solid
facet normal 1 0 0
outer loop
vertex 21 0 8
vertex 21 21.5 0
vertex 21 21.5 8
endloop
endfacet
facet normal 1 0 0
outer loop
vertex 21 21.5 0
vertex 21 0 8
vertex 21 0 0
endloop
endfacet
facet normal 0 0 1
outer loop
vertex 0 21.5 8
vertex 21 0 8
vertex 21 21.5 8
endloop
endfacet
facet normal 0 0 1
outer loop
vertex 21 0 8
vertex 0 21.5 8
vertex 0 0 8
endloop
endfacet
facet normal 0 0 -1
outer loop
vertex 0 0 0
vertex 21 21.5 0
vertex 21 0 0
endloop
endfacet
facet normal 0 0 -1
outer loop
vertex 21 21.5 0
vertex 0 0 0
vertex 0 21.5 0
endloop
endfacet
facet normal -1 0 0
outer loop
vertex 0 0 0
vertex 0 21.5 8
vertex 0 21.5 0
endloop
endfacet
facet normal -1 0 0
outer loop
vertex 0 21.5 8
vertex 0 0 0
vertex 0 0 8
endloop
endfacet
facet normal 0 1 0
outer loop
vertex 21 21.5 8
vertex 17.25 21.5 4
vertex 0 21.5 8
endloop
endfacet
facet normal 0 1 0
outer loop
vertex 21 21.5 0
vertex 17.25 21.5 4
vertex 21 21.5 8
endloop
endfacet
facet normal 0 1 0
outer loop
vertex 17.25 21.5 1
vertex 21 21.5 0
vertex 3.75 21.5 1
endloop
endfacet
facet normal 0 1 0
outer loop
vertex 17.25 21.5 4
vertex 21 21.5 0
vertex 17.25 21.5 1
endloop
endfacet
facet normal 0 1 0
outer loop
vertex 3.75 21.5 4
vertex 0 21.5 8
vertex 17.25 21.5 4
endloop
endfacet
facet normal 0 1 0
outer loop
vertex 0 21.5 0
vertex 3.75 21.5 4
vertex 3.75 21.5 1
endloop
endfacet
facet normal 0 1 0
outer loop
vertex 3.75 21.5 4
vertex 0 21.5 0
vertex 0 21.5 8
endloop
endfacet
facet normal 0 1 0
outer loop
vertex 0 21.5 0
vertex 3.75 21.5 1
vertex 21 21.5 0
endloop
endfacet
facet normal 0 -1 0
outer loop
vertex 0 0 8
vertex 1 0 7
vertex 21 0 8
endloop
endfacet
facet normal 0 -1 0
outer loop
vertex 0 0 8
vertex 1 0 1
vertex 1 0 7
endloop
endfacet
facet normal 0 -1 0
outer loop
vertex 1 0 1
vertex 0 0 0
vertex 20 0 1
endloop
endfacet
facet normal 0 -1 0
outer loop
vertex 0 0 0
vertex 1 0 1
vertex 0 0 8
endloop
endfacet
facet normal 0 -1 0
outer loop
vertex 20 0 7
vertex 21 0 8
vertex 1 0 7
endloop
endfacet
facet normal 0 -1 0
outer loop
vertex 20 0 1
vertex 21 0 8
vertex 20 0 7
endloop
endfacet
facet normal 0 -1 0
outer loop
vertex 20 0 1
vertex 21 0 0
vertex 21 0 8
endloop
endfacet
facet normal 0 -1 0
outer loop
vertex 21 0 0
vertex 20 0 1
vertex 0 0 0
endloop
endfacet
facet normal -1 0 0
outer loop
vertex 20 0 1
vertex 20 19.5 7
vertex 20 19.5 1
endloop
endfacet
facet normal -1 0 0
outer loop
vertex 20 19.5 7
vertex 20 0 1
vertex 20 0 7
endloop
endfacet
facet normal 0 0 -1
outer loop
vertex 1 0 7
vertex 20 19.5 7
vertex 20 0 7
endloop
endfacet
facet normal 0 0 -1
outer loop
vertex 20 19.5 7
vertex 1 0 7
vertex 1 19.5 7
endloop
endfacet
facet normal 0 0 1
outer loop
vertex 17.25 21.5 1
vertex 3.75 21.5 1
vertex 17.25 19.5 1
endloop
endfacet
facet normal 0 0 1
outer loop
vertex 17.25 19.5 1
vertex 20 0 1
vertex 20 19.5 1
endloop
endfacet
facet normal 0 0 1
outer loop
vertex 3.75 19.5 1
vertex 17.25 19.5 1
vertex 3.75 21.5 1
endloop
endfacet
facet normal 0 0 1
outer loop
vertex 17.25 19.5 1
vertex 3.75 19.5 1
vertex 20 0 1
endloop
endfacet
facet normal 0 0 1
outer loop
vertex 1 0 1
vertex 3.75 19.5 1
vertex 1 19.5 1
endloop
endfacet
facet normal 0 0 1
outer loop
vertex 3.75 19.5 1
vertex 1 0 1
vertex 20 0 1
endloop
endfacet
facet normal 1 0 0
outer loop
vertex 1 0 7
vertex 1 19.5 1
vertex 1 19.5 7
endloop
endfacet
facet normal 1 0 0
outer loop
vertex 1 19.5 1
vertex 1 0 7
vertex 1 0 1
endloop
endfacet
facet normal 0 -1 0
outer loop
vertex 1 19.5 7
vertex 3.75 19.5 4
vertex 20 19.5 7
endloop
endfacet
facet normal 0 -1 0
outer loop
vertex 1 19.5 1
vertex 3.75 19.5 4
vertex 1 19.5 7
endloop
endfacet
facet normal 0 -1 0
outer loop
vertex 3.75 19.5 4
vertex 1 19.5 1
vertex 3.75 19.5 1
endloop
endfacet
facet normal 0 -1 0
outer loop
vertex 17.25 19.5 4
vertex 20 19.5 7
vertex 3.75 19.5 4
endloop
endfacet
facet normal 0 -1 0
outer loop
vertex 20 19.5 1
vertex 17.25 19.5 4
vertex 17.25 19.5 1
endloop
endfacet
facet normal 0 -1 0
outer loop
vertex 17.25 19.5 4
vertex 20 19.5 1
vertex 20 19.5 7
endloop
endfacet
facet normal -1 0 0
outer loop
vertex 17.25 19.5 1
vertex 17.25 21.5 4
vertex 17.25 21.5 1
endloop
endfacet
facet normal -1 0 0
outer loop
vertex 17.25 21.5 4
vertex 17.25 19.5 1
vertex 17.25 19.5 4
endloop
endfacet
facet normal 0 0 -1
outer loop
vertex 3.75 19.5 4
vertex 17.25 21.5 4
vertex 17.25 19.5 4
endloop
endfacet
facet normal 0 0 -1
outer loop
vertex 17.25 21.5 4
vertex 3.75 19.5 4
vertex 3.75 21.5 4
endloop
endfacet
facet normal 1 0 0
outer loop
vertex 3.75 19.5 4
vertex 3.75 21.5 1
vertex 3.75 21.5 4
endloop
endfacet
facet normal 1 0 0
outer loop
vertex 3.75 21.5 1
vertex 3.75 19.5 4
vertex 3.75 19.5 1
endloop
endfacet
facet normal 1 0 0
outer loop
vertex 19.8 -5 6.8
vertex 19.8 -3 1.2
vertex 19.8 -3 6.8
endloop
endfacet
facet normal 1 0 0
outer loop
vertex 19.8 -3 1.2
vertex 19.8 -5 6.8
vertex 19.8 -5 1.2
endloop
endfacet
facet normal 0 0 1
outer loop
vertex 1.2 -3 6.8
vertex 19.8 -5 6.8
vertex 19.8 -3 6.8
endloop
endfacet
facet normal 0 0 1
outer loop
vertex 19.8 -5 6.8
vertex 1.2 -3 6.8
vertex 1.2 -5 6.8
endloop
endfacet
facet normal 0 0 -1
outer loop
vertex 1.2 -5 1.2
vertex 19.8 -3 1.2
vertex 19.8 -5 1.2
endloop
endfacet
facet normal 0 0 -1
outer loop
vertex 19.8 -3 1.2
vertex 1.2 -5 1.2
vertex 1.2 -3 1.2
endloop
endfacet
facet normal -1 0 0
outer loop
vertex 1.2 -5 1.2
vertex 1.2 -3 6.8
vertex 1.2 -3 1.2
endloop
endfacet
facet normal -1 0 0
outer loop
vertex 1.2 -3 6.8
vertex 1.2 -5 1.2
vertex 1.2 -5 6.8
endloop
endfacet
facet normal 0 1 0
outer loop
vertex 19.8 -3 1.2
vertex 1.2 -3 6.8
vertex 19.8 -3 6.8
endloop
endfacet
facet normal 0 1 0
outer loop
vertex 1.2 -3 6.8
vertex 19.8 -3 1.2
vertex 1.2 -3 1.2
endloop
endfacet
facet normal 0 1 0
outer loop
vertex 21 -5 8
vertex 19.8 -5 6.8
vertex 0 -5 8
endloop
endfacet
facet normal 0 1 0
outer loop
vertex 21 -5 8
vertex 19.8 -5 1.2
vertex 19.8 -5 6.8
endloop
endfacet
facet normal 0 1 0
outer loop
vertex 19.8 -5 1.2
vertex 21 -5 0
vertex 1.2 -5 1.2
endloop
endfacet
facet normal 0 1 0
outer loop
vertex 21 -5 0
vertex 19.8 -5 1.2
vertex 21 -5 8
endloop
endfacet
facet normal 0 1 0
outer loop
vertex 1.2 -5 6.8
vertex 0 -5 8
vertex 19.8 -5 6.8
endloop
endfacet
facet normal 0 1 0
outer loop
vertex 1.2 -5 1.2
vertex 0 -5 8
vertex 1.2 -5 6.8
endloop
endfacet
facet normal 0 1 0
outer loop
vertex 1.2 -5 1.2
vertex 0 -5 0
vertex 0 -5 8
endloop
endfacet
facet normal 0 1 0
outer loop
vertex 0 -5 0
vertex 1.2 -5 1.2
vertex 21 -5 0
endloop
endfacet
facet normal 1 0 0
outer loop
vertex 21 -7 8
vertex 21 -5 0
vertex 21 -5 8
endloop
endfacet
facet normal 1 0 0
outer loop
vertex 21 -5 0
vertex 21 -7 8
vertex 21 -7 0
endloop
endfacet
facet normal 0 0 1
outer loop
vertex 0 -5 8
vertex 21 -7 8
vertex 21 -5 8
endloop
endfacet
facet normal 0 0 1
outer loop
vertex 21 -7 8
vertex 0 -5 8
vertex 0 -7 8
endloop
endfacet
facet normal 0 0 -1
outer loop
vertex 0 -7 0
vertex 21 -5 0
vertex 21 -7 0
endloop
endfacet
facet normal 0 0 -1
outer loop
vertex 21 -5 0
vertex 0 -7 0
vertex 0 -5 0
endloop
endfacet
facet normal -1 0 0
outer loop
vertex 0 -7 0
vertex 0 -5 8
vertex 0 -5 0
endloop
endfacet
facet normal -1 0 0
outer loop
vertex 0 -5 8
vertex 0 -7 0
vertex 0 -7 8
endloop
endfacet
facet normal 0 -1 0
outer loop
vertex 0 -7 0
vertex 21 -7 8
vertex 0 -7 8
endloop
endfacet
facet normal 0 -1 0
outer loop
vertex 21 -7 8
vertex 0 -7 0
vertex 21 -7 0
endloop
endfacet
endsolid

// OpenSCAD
h = 8;//height
w = 21;//width
l = 21.5; //length

//slot
sh = 3; //slot-height
sw = 13.5; //slot-width

//lid opening 
sideTol = .2; //tolerance for the sides
topTol = .2; //tolerance for the top and bottom

//shell (will change the volume of the interior)
sideS = 2; //side-shell-thickness
topS = 2; // top- & bottom-shell-thickness
frontS = 1; //front-shell-thickness



difference(){
    cube([w, l, h], false);
    translate([1, -1, 1]){
        cube([w-sideS, l-frontS, h-topS], false);
    }
    translate([3.75, 0.25, 1]){
        cube([sw, l+0.25, sh], false);
    }
}

//lid
translate([1+sideTol, -5, 1+topTol]){
    cube([w-(sideS + 2*sideTol), 2, h-(topS + 2*topTol)], false);
}
translate([0, -7, 0]){
    cube([w, 2, h], false);
}


echo("\n\n\t\tThis is a design for a case for the Digispark\n\n");
